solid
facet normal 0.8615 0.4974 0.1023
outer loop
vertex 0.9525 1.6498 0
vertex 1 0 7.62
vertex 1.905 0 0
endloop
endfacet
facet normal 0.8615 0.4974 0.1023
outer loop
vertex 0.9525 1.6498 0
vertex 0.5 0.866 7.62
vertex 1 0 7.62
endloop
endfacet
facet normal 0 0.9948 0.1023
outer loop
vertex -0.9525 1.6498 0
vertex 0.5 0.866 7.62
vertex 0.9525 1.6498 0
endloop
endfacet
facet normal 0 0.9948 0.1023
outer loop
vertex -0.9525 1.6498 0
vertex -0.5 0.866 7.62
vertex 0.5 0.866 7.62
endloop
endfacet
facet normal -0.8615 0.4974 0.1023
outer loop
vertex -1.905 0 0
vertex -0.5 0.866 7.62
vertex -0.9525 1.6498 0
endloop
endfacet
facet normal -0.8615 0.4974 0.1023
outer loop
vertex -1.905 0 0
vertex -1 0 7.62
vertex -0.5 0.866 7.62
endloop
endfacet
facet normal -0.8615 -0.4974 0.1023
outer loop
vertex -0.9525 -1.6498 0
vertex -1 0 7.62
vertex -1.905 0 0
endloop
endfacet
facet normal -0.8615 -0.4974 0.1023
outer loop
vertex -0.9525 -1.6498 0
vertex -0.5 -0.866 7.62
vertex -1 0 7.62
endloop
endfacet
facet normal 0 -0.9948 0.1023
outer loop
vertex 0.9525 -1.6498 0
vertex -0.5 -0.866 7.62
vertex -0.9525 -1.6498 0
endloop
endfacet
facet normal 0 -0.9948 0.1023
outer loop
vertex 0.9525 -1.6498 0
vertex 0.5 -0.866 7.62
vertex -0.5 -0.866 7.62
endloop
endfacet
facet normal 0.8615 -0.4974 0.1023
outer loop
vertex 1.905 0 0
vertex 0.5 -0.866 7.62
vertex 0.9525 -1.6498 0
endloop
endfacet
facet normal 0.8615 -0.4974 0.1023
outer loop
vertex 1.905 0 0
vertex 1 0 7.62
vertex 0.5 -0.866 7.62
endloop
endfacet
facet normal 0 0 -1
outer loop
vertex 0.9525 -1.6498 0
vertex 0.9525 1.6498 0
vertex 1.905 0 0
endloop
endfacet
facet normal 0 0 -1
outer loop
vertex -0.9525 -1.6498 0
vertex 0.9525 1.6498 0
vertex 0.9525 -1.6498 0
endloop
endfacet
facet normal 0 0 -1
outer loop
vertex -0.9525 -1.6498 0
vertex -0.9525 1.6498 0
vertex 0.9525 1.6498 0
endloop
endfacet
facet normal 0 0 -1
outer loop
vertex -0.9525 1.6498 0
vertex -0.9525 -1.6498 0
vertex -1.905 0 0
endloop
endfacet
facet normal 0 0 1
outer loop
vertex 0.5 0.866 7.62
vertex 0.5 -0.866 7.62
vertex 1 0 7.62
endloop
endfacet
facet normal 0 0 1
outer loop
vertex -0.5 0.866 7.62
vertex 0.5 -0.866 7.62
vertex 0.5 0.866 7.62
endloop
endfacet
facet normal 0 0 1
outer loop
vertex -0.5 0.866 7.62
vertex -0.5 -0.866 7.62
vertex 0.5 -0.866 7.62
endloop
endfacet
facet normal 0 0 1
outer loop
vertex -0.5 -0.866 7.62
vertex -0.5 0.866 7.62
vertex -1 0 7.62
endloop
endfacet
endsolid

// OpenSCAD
/*

	JAG09 - BATTERY RISER ROD
	FRAME ASSEMBLY
	1. QTY. 4 REQUIRED PER DROID.
*/
centimetrosporpulgada = 2.54;
alturacilindro = 3.000*centimetrosporpulgada;
diametrocilindro = 0.75*centimetrosporpulgada;
diametroagujerointerior = 0.25*centimetrosporpulgada;
fondodeagujerointerior = 0.75*centimetrosporpulgada;

cylinder(alturacilindro,diametrocilindro);
